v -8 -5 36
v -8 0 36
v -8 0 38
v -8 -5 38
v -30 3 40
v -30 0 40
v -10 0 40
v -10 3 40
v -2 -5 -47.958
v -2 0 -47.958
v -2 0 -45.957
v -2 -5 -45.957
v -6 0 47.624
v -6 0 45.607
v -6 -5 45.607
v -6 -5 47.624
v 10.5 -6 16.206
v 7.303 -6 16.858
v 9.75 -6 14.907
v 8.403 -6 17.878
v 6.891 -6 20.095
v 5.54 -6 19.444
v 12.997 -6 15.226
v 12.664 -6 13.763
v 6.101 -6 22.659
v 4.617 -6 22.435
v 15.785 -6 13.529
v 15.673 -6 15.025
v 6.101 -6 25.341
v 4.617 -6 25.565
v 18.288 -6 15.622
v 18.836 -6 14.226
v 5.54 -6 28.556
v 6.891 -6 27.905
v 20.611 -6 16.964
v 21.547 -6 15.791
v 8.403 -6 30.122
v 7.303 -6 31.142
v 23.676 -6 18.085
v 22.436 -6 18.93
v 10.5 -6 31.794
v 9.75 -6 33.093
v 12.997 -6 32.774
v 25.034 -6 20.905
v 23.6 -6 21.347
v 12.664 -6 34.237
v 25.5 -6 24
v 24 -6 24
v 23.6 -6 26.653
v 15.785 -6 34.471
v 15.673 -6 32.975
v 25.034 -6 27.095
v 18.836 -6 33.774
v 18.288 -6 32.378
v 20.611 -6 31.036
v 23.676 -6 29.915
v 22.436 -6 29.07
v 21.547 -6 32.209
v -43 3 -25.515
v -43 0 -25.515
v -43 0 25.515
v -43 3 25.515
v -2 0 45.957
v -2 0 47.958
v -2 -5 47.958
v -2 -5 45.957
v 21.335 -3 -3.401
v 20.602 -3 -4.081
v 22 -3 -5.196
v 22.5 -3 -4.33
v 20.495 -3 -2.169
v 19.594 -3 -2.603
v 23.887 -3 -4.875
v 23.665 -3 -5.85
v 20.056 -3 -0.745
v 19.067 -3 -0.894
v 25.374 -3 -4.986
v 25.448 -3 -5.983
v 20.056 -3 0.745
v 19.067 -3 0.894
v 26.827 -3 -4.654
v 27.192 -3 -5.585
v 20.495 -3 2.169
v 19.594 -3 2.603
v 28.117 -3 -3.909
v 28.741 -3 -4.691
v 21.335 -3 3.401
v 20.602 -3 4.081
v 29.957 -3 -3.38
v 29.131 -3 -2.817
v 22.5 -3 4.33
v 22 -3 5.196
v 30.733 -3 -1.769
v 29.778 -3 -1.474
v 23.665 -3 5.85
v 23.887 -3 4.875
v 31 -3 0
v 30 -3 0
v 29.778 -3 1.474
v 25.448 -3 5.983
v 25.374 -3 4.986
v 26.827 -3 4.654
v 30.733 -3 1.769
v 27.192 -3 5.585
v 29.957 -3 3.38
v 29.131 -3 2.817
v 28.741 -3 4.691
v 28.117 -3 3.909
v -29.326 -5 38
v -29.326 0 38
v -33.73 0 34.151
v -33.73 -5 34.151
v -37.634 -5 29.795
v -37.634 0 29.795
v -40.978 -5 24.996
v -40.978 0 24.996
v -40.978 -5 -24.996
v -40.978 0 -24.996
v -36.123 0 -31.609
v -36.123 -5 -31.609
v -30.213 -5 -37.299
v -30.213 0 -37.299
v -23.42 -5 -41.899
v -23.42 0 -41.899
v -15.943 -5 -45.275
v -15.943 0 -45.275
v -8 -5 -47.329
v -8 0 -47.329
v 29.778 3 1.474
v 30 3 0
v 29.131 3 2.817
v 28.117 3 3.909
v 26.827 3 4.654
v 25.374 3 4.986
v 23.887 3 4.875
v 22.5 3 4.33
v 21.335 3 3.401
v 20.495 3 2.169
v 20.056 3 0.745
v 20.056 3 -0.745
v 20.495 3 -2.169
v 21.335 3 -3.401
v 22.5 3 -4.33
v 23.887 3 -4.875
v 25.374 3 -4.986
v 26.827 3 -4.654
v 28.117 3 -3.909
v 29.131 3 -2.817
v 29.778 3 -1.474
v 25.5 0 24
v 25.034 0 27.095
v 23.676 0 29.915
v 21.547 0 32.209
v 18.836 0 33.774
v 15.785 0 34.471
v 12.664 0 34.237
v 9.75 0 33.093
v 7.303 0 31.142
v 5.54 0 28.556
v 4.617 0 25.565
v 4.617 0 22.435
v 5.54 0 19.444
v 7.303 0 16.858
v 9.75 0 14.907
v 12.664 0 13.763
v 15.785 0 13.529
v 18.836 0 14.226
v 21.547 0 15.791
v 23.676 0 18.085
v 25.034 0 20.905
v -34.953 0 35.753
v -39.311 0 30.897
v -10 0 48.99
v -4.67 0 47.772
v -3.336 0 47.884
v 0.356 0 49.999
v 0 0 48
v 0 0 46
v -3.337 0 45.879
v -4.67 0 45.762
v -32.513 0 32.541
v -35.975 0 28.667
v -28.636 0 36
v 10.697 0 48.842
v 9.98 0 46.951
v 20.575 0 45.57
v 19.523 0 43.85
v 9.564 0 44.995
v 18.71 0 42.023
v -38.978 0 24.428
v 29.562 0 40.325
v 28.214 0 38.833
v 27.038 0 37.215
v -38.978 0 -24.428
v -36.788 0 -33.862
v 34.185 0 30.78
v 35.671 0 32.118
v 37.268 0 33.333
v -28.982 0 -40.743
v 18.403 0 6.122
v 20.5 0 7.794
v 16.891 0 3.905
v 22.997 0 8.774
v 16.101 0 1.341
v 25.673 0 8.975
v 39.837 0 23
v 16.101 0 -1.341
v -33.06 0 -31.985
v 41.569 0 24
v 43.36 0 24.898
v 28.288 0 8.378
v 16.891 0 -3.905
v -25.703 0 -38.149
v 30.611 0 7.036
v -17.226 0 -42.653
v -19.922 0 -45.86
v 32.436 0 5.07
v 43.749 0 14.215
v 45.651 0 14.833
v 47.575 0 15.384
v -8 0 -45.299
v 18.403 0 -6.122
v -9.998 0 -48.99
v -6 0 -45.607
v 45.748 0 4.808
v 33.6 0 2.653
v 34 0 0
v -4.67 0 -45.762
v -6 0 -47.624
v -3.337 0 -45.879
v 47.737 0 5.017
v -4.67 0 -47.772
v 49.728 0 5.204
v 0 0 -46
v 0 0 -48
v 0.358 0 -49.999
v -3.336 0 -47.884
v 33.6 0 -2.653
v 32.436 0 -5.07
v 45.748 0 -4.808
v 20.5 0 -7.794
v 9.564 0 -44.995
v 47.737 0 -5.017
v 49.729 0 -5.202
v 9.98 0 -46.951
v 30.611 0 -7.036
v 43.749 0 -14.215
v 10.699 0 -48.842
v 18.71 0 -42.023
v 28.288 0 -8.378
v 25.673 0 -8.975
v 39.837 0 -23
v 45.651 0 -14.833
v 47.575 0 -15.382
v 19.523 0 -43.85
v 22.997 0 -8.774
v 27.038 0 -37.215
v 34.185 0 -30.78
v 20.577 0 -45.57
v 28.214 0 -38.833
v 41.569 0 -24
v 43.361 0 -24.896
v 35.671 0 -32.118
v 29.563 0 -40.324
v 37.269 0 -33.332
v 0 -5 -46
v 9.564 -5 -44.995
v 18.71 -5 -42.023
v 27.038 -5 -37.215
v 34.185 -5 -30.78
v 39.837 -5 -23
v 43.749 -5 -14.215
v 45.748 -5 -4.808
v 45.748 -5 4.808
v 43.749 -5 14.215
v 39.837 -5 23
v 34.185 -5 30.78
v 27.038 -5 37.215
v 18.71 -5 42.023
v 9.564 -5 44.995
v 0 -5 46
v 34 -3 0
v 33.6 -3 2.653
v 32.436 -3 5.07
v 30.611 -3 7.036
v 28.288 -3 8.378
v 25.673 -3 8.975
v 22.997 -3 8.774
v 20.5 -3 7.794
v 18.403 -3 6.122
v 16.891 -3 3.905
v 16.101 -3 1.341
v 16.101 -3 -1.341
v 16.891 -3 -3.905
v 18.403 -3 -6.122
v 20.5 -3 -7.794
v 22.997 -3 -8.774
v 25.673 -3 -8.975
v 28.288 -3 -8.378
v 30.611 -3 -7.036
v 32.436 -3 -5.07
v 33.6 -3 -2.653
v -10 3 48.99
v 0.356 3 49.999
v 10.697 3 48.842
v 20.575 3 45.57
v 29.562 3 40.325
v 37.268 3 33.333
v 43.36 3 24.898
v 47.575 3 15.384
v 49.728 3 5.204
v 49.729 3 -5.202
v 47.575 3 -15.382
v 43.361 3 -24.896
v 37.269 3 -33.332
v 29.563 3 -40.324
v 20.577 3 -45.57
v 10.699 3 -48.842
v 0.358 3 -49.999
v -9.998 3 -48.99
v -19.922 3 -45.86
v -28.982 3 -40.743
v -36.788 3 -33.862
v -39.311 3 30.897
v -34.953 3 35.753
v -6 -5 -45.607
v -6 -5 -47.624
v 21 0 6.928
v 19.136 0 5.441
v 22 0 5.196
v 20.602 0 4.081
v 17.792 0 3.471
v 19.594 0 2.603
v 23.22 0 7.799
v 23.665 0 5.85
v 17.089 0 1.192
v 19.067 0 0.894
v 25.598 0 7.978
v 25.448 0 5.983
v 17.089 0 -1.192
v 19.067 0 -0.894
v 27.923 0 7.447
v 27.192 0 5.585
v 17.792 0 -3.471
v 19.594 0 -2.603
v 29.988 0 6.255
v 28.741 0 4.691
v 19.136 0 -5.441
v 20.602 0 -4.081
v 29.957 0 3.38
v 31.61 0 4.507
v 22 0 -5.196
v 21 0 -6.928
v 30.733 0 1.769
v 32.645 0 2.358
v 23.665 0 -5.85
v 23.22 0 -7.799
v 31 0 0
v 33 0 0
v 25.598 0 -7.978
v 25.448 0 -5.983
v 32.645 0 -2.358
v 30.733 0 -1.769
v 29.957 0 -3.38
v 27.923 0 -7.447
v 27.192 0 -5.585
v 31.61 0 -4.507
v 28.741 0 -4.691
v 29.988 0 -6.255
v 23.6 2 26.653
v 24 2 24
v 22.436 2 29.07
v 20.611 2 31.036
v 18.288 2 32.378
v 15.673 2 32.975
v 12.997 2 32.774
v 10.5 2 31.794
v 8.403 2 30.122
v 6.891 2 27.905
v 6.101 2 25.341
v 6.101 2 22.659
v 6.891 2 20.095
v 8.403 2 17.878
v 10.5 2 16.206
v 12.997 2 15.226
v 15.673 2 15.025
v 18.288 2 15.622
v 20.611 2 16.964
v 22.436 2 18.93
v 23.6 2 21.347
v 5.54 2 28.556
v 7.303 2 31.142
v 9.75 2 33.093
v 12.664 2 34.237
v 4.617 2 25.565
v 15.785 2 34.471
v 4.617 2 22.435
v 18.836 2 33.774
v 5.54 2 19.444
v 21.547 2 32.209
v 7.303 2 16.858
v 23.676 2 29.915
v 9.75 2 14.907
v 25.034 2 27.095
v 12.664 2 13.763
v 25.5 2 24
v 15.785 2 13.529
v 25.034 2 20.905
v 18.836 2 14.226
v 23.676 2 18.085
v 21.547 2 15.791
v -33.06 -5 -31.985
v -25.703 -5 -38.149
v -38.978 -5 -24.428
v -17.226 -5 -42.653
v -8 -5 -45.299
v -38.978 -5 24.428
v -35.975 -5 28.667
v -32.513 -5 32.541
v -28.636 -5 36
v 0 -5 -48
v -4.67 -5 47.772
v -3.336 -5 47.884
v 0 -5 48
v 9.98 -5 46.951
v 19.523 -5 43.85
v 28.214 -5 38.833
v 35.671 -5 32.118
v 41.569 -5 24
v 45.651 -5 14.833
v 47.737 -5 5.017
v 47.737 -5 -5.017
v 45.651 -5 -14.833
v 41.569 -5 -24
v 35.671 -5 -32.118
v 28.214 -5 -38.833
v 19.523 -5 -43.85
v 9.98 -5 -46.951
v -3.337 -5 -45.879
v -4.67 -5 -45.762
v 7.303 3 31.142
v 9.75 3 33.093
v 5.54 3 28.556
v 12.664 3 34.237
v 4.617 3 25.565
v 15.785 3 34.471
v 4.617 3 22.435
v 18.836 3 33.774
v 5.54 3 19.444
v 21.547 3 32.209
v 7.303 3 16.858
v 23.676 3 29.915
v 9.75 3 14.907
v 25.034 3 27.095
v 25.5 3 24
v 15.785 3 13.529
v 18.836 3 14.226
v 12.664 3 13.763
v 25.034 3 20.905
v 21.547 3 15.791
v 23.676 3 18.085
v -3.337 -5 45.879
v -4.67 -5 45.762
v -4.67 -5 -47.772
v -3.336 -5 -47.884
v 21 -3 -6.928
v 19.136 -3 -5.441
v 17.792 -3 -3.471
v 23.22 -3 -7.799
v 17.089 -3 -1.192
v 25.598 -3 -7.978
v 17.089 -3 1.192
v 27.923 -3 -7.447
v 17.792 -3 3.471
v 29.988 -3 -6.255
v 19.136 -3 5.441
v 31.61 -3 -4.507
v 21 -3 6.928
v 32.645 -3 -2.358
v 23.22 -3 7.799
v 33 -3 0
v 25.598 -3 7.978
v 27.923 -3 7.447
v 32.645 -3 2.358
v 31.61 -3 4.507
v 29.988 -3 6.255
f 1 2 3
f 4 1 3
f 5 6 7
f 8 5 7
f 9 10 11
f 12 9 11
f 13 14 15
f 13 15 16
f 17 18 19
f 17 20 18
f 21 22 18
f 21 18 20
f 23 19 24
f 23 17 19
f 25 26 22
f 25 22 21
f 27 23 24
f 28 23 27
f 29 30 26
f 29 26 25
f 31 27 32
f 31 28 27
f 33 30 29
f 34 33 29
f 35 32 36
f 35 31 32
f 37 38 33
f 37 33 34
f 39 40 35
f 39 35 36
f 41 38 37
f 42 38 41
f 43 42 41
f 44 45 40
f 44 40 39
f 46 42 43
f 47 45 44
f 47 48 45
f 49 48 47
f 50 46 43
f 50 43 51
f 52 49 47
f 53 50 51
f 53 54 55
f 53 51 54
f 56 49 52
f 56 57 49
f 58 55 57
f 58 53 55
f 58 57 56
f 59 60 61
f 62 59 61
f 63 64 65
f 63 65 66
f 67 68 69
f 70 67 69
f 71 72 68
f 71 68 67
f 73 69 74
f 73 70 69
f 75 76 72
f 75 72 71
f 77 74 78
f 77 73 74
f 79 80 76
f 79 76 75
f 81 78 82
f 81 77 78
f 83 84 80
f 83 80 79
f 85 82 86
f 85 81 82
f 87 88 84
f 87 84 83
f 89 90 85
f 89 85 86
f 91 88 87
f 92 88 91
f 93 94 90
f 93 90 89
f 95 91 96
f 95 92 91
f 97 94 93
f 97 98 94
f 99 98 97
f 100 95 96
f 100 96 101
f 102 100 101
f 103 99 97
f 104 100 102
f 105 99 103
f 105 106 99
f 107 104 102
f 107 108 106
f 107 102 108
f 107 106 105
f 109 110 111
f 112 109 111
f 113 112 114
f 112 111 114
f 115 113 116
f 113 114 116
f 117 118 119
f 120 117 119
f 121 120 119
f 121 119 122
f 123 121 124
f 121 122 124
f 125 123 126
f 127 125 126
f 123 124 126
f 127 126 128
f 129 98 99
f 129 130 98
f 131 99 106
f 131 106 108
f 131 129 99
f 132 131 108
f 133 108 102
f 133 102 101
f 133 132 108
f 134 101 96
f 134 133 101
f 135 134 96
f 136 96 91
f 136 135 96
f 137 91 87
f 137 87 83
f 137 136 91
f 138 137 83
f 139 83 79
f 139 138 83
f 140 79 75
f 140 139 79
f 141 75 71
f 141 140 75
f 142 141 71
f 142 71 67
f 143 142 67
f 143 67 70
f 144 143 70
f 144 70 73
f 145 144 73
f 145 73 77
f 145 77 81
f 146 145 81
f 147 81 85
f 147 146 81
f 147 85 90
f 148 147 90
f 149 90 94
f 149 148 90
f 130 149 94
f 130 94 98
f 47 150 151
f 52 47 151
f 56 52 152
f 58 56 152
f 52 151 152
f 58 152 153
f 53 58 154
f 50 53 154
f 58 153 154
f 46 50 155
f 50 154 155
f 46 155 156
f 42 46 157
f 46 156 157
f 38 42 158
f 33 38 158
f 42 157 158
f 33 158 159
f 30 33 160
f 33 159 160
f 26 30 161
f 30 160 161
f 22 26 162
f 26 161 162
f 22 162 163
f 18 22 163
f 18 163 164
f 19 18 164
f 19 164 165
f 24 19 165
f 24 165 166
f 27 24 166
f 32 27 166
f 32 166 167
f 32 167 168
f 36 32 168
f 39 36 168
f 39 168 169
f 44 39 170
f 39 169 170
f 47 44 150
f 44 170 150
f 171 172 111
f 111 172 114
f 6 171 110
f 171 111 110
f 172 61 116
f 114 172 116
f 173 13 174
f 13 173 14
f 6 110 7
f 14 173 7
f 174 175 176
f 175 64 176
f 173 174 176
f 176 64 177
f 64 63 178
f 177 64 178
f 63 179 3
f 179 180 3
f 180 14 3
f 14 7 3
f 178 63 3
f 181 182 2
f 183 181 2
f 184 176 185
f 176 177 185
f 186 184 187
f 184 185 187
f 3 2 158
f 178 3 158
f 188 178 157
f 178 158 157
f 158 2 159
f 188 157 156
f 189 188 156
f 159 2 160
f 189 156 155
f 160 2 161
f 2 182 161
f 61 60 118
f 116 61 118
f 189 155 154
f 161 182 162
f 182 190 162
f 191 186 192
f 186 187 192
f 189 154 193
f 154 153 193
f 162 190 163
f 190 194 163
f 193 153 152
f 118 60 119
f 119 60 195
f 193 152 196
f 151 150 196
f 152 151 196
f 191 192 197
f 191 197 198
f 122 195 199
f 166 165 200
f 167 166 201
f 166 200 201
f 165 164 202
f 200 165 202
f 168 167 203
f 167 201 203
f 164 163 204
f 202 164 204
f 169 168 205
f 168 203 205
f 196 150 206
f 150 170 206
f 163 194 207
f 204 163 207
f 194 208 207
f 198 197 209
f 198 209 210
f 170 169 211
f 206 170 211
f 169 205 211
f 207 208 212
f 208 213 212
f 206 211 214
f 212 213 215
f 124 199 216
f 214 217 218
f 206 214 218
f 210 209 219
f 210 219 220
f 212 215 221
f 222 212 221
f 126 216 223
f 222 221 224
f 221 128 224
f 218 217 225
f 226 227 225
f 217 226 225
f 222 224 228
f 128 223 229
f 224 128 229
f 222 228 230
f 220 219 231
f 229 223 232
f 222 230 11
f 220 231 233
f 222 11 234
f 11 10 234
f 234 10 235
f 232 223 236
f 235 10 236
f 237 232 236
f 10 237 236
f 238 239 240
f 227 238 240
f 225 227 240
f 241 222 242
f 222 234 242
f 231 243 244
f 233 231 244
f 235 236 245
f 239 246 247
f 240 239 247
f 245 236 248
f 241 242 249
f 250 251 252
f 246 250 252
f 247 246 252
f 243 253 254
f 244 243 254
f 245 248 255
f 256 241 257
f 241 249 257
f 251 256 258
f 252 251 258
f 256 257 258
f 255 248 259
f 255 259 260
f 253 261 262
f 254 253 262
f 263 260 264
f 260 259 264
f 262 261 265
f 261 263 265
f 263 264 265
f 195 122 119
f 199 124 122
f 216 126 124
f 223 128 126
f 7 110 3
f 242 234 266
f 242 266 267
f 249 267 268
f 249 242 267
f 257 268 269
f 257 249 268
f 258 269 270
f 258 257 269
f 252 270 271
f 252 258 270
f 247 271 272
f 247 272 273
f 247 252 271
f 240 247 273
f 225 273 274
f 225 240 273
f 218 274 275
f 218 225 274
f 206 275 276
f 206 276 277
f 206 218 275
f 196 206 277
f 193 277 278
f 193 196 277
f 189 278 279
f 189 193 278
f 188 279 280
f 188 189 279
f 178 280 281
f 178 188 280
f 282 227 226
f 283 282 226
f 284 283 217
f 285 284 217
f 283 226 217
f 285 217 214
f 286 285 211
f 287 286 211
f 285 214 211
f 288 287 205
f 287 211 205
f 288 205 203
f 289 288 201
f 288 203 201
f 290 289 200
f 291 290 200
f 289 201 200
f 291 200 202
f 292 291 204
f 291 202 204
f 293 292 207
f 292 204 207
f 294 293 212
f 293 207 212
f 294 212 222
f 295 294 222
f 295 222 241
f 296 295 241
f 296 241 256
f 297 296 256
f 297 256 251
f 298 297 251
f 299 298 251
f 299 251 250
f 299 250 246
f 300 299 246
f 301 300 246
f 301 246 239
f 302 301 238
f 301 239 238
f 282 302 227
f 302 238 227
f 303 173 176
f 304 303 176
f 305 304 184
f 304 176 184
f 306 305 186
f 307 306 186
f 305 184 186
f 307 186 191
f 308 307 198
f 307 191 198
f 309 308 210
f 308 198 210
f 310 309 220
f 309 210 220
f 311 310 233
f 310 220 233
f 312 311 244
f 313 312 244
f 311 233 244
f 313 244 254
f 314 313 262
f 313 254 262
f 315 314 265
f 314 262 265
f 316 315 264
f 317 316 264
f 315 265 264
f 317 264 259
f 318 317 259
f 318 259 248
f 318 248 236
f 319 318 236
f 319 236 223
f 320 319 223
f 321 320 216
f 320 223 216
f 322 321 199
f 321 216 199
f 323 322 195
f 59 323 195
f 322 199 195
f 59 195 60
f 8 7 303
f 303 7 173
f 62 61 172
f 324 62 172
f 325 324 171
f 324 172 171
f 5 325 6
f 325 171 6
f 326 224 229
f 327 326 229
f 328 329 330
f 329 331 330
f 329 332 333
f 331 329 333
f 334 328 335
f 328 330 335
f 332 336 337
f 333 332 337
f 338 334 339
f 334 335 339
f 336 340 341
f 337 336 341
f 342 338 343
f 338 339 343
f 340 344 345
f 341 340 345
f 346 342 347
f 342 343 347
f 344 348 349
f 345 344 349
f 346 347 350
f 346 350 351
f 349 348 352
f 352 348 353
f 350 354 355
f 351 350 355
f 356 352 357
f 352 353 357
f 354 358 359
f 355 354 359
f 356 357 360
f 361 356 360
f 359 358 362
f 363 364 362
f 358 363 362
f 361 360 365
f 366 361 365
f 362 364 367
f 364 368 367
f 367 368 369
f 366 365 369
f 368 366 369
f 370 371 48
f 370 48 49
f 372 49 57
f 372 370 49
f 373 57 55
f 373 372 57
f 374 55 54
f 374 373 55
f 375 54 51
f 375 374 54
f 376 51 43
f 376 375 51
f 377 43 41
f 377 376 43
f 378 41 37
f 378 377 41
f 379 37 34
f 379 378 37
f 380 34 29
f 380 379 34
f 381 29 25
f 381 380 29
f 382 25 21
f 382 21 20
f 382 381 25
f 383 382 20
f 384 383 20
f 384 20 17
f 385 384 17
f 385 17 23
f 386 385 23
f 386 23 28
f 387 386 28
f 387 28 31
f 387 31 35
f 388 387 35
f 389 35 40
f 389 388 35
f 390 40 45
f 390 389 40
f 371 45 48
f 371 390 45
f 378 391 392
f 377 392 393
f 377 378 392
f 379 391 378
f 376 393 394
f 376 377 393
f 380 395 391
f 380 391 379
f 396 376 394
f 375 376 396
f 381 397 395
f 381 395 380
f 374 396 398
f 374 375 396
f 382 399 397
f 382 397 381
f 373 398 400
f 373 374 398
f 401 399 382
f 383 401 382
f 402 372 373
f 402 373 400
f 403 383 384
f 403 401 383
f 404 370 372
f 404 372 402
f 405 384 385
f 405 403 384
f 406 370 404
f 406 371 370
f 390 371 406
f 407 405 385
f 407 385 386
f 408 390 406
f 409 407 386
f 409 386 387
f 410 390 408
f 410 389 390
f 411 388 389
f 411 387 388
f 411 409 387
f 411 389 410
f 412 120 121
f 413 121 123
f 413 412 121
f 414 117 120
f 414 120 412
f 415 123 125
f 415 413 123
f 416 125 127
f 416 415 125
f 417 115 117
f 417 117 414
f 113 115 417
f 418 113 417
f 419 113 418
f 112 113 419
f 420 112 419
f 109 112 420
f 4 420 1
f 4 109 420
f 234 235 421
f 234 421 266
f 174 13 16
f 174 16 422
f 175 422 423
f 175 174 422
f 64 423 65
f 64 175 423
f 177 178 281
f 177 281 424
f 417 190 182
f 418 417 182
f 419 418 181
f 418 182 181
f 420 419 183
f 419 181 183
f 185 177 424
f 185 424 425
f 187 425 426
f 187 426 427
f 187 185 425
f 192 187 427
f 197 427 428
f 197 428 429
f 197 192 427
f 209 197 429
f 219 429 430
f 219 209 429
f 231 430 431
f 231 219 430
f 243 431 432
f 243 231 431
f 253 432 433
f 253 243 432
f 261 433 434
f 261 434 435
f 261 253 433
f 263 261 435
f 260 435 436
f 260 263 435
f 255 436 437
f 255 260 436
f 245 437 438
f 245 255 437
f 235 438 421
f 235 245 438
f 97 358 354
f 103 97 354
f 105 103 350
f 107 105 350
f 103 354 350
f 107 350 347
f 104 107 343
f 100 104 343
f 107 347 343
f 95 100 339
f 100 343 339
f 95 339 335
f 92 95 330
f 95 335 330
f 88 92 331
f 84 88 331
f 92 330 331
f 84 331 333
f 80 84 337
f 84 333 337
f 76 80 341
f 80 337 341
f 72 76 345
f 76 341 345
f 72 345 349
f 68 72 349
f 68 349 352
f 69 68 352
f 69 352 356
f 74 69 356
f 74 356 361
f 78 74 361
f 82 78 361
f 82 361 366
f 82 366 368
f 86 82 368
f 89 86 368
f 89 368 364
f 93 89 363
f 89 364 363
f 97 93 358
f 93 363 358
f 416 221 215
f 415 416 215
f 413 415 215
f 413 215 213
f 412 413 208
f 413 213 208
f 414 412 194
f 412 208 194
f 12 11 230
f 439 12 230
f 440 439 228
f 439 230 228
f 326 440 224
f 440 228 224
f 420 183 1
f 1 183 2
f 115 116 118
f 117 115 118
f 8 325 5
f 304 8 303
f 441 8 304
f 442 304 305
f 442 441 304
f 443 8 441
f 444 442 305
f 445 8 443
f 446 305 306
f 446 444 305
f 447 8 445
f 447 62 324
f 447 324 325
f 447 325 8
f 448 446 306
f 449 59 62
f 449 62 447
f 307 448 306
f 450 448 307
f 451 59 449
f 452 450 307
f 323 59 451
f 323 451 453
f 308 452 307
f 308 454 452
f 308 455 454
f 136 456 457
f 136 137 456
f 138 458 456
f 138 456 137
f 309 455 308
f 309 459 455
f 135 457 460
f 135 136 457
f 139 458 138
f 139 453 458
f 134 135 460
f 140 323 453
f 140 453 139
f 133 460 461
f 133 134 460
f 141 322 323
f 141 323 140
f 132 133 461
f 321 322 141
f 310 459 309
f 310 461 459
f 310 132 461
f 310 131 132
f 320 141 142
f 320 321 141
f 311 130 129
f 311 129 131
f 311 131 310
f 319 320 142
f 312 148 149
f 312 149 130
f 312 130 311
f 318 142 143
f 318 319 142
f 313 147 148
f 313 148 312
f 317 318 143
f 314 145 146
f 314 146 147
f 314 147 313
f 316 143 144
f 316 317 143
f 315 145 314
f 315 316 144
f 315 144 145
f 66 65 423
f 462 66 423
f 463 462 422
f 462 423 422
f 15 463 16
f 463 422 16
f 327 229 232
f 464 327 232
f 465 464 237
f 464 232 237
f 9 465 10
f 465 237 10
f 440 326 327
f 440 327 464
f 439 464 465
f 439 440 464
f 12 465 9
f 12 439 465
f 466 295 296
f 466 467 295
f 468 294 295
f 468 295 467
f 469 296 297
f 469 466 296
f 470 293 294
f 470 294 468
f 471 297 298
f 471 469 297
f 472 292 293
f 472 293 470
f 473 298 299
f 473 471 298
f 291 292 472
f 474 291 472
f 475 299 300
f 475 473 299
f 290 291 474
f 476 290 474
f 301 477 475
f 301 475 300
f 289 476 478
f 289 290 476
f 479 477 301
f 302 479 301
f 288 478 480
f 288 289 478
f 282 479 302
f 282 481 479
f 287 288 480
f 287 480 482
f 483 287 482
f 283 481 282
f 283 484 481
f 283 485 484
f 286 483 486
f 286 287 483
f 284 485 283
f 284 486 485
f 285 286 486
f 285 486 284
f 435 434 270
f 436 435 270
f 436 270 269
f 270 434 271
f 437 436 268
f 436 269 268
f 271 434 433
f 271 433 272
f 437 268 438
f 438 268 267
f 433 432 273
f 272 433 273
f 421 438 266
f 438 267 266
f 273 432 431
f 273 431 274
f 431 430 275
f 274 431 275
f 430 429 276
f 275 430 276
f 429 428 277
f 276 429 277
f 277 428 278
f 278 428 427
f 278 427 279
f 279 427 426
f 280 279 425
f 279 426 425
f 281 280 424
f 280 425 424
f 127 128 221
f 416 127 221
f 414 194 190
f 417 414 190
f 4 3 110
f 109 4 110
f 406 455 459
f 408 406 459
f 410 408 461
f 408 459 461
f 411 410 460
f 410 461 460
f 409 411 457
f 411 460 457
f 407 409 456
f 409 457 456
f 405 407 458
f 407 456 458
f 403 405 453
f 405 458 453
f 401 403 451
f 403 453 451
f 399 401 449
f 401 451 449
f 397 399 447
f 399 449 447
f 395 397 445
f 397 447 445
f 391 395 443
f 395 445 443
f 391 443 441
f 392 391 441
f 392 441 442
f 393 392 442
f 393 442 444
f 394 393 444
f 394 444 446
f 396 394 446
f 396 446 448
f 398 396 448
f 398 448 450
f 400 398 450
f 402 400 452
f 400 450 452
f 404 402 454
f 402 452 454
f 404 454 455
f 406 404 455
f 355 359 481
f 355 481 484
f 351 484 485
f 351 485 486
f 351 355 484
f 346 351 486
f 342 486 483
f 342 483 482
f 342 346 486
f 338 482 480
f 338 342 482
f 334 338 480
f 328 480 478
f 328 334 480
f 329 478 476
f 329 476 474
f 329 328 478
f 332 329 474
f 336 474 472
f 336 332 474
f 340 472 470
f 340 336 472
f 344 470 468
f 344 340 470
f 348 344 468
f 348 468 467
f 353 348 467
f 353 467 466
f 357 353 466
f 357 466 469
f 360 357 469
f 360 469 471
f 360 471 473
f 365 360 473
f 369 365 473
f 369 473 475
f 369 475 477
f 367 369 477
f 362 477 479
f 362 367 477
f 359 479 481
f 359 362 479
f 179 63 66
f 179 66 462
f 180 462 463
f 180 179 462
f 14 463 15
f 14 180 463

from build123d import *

# Parameters (mm, degrees)
BOSS_EXTRUDE1_DEPTH = 3
BOSS_EXTRUDE2_DEPTH = 5
SKETCH3_R           = 5
SKETCH3_R_2         = 9
CUT_EXTRUDE1_DEPTH  = 3
SKETCH4_R           = 9
SKETCH4_R_2         = 8
BOSS_EXTRUDE3_DEPTH = 3
BOSS_EXTRUDE4_START = 3
SKETCH4_3_R         = 6
SKETCH4_3_R_2       = 5
BOSS_EXTRUDE4_DEPTH = 3
BOSS_EXTRUDE5_START = 6
SKETCH6_R           = 10.5
SKETCH6_R_2         = 9
BOSS_EXTRUDE5_DEPTH = 6
CUT_EXTRUDE2_START  = -1
SKETCH7_R           = 10.5
SKETCH7_R_2         = 9
CUT_EXTRUDE2_DEPTH  = 1


with BuildPart() as part:
    # Sketch1 → Boss-Extrude1 (new body)
    with BuildSketch(Plane(origin=(0, 0, 0), x_dir=(1, 0, 0), z_dir=(0, 1, 0))):
        with BuildLine():
            Line((-43, 25.514701644), (-43, -25.514701644))
            ThreePointArc((-43, -25.514701644), (-37.211637523, -33.396018219), (-30, -40))
            Line((-30, -40), (-10, -40))
            Line((-10, -40), (-10, -48.989794856))
            ThreePointArc((-10, -48.989794856), (45.716299059, 20.248950598), (-43, 25.514701644))
        make_face()
    extrude(amount=BOSS_EXTRUDE1_DEPTH)

    # Sketch2 → Boss-Extrude2 (add)
    with BuildSketch(Plane.XZ):
        with BuildLine():
            Line((-40.978122, 24.995870006), (-40.978122, -24.995870006))
            ThreePointArc((-40.978122, -24.995870006), (-26.914721681, -39.744153744), (-8, -47.328638265))
            Line((-8, -47.328638265), (-8, -45.299006612))
            ThreePointArc((-8, -45.299006612), (-25.702922785, -38.149177715), (-38.978122, -24.427566505))
            Line((-38.978122, -24.427566505), (-38.978122, 24.427566505))
            ThreePointArc((-38.978122, 24.427566505), (-34.298477795, 30.653130687), (-28.635642127, 36))
            Line((-28.635642127, 36), (-8, 36))
            Line((-8, 36), (-8, 38))
            Line((-8, 38), (-29.325756597, 38))
            ThreePointArc((-29.325756597, 38), (-35.748226329, 32.032238672), (-40.978122, 24.995870006))
        make_face()
        with BuildLine():
            Line((-6, 45.607017004), (-6, 47.623523599))
            ThreePointArc((-6, 47.623523599), (-4.003501138, 47.832750064), (-2, 47.958315233))
            Line((-2, 47.958315233), (-2, 45.956501172))
            ThreePointArc((-2, 45.956501172), (-4.00381503, 45.825423786), (-6, 45.607017004))
        make_face()
        with BuildLine():
            Line((-6, -45.607017004), (-6, -47.623523599))
            ThreePointArc((-6, -47.623523599), (-4.003501138, -47.832750064), (-2, -47.958315233))
            Line((-2, -47.958315233), (-2, -45.956501172))
            ThreePointArc((-2, -45.956501172), (-4.00381503, -45.825423786), (-6, -45.607017004))
        make_face()
        with BuildLine():
            Line((0, 46), (0, 48))
            ThreePointArc((0, 48), (48, 0), (0, -48))
            Line((0, -48), (0, -46))
            ThreePointArc((0, -46), (46, 0), (0, 46))
        make_face()
    extrude(amount=BOSS_EXTRUDE2_DEPTH)

    # Sketch3 → Cut-Extrude1 (cut)
    with BuildSketch(Plane.XZ):
        with Locations((25, 0)):
            Circle(SKETCH3_R)
        with Locations((15, 24)):
            Circle(SKETCH3_R_2)
    extrude(amount=-CUT_EXTRUDE1_DEPTH, mode=Mode.SUBTRACT)

    # Sketch4 → Boss-Extrude3 (add)
    with BuildSketch(Plane.XZ):
        with Locations((25, 0)):
            Circle(SKETCH4_R)
        with Locations((25, 0)):
            Circle(SKETCH4_R_2, mode=Mode.SUBTRACT)
    extrude(amount=BOSS_EXTRUDE3_DEPTH)

    # Sketch4<3> → Boss-Extrude4 (add)
    with BuildSketch(Plane.XZ.offset(BOSS_EXTRUDE4_START)):
        with Locations((25, 0)):
            Circle(SKETCH4_3_R)
        with Locations((25, 0)):
            Circle(SKETCH4_3_R_2, mode=Mode.SUBTRACT)
    extrude(amount=-BOSS_EXTRUDE4_DEPTH)

    # Sketch6 → Boss-Extrude5 (add)
    with BuildSketch(Plane.XZ.offset(BOSS_EXTRUDE5_START)):
        with Locations((15, 24)):
            Circle(SKETCH6_R)
        with Locations((15, 24)):
            Circle(SKETCH6_R_2, mode=Mode.SUBTRACT)
    extrude(amount=-BOSS_EXTRUDE5_DEPTH)

    # Sketch7 → Cut-Extrude2 (cut)
    with BuildSketch(Plane(origin=(0, 3, 0), x_dir=(1, 0, 0), z_dir=(0, 1, 0)).offset(CUT_EXTRUDE2_START)):
        with Locations((15, -24)):
            Circle(SKETCH7_R)
        with Locations((15, -24)):
            Circle(SKETCH7_R_2, mode=Mode.SUBTRACT)
    extrude(amount=CUT_EXTRUDE2_DEPTH, mode=Mode.SUBTRACT)


solid = part.part
